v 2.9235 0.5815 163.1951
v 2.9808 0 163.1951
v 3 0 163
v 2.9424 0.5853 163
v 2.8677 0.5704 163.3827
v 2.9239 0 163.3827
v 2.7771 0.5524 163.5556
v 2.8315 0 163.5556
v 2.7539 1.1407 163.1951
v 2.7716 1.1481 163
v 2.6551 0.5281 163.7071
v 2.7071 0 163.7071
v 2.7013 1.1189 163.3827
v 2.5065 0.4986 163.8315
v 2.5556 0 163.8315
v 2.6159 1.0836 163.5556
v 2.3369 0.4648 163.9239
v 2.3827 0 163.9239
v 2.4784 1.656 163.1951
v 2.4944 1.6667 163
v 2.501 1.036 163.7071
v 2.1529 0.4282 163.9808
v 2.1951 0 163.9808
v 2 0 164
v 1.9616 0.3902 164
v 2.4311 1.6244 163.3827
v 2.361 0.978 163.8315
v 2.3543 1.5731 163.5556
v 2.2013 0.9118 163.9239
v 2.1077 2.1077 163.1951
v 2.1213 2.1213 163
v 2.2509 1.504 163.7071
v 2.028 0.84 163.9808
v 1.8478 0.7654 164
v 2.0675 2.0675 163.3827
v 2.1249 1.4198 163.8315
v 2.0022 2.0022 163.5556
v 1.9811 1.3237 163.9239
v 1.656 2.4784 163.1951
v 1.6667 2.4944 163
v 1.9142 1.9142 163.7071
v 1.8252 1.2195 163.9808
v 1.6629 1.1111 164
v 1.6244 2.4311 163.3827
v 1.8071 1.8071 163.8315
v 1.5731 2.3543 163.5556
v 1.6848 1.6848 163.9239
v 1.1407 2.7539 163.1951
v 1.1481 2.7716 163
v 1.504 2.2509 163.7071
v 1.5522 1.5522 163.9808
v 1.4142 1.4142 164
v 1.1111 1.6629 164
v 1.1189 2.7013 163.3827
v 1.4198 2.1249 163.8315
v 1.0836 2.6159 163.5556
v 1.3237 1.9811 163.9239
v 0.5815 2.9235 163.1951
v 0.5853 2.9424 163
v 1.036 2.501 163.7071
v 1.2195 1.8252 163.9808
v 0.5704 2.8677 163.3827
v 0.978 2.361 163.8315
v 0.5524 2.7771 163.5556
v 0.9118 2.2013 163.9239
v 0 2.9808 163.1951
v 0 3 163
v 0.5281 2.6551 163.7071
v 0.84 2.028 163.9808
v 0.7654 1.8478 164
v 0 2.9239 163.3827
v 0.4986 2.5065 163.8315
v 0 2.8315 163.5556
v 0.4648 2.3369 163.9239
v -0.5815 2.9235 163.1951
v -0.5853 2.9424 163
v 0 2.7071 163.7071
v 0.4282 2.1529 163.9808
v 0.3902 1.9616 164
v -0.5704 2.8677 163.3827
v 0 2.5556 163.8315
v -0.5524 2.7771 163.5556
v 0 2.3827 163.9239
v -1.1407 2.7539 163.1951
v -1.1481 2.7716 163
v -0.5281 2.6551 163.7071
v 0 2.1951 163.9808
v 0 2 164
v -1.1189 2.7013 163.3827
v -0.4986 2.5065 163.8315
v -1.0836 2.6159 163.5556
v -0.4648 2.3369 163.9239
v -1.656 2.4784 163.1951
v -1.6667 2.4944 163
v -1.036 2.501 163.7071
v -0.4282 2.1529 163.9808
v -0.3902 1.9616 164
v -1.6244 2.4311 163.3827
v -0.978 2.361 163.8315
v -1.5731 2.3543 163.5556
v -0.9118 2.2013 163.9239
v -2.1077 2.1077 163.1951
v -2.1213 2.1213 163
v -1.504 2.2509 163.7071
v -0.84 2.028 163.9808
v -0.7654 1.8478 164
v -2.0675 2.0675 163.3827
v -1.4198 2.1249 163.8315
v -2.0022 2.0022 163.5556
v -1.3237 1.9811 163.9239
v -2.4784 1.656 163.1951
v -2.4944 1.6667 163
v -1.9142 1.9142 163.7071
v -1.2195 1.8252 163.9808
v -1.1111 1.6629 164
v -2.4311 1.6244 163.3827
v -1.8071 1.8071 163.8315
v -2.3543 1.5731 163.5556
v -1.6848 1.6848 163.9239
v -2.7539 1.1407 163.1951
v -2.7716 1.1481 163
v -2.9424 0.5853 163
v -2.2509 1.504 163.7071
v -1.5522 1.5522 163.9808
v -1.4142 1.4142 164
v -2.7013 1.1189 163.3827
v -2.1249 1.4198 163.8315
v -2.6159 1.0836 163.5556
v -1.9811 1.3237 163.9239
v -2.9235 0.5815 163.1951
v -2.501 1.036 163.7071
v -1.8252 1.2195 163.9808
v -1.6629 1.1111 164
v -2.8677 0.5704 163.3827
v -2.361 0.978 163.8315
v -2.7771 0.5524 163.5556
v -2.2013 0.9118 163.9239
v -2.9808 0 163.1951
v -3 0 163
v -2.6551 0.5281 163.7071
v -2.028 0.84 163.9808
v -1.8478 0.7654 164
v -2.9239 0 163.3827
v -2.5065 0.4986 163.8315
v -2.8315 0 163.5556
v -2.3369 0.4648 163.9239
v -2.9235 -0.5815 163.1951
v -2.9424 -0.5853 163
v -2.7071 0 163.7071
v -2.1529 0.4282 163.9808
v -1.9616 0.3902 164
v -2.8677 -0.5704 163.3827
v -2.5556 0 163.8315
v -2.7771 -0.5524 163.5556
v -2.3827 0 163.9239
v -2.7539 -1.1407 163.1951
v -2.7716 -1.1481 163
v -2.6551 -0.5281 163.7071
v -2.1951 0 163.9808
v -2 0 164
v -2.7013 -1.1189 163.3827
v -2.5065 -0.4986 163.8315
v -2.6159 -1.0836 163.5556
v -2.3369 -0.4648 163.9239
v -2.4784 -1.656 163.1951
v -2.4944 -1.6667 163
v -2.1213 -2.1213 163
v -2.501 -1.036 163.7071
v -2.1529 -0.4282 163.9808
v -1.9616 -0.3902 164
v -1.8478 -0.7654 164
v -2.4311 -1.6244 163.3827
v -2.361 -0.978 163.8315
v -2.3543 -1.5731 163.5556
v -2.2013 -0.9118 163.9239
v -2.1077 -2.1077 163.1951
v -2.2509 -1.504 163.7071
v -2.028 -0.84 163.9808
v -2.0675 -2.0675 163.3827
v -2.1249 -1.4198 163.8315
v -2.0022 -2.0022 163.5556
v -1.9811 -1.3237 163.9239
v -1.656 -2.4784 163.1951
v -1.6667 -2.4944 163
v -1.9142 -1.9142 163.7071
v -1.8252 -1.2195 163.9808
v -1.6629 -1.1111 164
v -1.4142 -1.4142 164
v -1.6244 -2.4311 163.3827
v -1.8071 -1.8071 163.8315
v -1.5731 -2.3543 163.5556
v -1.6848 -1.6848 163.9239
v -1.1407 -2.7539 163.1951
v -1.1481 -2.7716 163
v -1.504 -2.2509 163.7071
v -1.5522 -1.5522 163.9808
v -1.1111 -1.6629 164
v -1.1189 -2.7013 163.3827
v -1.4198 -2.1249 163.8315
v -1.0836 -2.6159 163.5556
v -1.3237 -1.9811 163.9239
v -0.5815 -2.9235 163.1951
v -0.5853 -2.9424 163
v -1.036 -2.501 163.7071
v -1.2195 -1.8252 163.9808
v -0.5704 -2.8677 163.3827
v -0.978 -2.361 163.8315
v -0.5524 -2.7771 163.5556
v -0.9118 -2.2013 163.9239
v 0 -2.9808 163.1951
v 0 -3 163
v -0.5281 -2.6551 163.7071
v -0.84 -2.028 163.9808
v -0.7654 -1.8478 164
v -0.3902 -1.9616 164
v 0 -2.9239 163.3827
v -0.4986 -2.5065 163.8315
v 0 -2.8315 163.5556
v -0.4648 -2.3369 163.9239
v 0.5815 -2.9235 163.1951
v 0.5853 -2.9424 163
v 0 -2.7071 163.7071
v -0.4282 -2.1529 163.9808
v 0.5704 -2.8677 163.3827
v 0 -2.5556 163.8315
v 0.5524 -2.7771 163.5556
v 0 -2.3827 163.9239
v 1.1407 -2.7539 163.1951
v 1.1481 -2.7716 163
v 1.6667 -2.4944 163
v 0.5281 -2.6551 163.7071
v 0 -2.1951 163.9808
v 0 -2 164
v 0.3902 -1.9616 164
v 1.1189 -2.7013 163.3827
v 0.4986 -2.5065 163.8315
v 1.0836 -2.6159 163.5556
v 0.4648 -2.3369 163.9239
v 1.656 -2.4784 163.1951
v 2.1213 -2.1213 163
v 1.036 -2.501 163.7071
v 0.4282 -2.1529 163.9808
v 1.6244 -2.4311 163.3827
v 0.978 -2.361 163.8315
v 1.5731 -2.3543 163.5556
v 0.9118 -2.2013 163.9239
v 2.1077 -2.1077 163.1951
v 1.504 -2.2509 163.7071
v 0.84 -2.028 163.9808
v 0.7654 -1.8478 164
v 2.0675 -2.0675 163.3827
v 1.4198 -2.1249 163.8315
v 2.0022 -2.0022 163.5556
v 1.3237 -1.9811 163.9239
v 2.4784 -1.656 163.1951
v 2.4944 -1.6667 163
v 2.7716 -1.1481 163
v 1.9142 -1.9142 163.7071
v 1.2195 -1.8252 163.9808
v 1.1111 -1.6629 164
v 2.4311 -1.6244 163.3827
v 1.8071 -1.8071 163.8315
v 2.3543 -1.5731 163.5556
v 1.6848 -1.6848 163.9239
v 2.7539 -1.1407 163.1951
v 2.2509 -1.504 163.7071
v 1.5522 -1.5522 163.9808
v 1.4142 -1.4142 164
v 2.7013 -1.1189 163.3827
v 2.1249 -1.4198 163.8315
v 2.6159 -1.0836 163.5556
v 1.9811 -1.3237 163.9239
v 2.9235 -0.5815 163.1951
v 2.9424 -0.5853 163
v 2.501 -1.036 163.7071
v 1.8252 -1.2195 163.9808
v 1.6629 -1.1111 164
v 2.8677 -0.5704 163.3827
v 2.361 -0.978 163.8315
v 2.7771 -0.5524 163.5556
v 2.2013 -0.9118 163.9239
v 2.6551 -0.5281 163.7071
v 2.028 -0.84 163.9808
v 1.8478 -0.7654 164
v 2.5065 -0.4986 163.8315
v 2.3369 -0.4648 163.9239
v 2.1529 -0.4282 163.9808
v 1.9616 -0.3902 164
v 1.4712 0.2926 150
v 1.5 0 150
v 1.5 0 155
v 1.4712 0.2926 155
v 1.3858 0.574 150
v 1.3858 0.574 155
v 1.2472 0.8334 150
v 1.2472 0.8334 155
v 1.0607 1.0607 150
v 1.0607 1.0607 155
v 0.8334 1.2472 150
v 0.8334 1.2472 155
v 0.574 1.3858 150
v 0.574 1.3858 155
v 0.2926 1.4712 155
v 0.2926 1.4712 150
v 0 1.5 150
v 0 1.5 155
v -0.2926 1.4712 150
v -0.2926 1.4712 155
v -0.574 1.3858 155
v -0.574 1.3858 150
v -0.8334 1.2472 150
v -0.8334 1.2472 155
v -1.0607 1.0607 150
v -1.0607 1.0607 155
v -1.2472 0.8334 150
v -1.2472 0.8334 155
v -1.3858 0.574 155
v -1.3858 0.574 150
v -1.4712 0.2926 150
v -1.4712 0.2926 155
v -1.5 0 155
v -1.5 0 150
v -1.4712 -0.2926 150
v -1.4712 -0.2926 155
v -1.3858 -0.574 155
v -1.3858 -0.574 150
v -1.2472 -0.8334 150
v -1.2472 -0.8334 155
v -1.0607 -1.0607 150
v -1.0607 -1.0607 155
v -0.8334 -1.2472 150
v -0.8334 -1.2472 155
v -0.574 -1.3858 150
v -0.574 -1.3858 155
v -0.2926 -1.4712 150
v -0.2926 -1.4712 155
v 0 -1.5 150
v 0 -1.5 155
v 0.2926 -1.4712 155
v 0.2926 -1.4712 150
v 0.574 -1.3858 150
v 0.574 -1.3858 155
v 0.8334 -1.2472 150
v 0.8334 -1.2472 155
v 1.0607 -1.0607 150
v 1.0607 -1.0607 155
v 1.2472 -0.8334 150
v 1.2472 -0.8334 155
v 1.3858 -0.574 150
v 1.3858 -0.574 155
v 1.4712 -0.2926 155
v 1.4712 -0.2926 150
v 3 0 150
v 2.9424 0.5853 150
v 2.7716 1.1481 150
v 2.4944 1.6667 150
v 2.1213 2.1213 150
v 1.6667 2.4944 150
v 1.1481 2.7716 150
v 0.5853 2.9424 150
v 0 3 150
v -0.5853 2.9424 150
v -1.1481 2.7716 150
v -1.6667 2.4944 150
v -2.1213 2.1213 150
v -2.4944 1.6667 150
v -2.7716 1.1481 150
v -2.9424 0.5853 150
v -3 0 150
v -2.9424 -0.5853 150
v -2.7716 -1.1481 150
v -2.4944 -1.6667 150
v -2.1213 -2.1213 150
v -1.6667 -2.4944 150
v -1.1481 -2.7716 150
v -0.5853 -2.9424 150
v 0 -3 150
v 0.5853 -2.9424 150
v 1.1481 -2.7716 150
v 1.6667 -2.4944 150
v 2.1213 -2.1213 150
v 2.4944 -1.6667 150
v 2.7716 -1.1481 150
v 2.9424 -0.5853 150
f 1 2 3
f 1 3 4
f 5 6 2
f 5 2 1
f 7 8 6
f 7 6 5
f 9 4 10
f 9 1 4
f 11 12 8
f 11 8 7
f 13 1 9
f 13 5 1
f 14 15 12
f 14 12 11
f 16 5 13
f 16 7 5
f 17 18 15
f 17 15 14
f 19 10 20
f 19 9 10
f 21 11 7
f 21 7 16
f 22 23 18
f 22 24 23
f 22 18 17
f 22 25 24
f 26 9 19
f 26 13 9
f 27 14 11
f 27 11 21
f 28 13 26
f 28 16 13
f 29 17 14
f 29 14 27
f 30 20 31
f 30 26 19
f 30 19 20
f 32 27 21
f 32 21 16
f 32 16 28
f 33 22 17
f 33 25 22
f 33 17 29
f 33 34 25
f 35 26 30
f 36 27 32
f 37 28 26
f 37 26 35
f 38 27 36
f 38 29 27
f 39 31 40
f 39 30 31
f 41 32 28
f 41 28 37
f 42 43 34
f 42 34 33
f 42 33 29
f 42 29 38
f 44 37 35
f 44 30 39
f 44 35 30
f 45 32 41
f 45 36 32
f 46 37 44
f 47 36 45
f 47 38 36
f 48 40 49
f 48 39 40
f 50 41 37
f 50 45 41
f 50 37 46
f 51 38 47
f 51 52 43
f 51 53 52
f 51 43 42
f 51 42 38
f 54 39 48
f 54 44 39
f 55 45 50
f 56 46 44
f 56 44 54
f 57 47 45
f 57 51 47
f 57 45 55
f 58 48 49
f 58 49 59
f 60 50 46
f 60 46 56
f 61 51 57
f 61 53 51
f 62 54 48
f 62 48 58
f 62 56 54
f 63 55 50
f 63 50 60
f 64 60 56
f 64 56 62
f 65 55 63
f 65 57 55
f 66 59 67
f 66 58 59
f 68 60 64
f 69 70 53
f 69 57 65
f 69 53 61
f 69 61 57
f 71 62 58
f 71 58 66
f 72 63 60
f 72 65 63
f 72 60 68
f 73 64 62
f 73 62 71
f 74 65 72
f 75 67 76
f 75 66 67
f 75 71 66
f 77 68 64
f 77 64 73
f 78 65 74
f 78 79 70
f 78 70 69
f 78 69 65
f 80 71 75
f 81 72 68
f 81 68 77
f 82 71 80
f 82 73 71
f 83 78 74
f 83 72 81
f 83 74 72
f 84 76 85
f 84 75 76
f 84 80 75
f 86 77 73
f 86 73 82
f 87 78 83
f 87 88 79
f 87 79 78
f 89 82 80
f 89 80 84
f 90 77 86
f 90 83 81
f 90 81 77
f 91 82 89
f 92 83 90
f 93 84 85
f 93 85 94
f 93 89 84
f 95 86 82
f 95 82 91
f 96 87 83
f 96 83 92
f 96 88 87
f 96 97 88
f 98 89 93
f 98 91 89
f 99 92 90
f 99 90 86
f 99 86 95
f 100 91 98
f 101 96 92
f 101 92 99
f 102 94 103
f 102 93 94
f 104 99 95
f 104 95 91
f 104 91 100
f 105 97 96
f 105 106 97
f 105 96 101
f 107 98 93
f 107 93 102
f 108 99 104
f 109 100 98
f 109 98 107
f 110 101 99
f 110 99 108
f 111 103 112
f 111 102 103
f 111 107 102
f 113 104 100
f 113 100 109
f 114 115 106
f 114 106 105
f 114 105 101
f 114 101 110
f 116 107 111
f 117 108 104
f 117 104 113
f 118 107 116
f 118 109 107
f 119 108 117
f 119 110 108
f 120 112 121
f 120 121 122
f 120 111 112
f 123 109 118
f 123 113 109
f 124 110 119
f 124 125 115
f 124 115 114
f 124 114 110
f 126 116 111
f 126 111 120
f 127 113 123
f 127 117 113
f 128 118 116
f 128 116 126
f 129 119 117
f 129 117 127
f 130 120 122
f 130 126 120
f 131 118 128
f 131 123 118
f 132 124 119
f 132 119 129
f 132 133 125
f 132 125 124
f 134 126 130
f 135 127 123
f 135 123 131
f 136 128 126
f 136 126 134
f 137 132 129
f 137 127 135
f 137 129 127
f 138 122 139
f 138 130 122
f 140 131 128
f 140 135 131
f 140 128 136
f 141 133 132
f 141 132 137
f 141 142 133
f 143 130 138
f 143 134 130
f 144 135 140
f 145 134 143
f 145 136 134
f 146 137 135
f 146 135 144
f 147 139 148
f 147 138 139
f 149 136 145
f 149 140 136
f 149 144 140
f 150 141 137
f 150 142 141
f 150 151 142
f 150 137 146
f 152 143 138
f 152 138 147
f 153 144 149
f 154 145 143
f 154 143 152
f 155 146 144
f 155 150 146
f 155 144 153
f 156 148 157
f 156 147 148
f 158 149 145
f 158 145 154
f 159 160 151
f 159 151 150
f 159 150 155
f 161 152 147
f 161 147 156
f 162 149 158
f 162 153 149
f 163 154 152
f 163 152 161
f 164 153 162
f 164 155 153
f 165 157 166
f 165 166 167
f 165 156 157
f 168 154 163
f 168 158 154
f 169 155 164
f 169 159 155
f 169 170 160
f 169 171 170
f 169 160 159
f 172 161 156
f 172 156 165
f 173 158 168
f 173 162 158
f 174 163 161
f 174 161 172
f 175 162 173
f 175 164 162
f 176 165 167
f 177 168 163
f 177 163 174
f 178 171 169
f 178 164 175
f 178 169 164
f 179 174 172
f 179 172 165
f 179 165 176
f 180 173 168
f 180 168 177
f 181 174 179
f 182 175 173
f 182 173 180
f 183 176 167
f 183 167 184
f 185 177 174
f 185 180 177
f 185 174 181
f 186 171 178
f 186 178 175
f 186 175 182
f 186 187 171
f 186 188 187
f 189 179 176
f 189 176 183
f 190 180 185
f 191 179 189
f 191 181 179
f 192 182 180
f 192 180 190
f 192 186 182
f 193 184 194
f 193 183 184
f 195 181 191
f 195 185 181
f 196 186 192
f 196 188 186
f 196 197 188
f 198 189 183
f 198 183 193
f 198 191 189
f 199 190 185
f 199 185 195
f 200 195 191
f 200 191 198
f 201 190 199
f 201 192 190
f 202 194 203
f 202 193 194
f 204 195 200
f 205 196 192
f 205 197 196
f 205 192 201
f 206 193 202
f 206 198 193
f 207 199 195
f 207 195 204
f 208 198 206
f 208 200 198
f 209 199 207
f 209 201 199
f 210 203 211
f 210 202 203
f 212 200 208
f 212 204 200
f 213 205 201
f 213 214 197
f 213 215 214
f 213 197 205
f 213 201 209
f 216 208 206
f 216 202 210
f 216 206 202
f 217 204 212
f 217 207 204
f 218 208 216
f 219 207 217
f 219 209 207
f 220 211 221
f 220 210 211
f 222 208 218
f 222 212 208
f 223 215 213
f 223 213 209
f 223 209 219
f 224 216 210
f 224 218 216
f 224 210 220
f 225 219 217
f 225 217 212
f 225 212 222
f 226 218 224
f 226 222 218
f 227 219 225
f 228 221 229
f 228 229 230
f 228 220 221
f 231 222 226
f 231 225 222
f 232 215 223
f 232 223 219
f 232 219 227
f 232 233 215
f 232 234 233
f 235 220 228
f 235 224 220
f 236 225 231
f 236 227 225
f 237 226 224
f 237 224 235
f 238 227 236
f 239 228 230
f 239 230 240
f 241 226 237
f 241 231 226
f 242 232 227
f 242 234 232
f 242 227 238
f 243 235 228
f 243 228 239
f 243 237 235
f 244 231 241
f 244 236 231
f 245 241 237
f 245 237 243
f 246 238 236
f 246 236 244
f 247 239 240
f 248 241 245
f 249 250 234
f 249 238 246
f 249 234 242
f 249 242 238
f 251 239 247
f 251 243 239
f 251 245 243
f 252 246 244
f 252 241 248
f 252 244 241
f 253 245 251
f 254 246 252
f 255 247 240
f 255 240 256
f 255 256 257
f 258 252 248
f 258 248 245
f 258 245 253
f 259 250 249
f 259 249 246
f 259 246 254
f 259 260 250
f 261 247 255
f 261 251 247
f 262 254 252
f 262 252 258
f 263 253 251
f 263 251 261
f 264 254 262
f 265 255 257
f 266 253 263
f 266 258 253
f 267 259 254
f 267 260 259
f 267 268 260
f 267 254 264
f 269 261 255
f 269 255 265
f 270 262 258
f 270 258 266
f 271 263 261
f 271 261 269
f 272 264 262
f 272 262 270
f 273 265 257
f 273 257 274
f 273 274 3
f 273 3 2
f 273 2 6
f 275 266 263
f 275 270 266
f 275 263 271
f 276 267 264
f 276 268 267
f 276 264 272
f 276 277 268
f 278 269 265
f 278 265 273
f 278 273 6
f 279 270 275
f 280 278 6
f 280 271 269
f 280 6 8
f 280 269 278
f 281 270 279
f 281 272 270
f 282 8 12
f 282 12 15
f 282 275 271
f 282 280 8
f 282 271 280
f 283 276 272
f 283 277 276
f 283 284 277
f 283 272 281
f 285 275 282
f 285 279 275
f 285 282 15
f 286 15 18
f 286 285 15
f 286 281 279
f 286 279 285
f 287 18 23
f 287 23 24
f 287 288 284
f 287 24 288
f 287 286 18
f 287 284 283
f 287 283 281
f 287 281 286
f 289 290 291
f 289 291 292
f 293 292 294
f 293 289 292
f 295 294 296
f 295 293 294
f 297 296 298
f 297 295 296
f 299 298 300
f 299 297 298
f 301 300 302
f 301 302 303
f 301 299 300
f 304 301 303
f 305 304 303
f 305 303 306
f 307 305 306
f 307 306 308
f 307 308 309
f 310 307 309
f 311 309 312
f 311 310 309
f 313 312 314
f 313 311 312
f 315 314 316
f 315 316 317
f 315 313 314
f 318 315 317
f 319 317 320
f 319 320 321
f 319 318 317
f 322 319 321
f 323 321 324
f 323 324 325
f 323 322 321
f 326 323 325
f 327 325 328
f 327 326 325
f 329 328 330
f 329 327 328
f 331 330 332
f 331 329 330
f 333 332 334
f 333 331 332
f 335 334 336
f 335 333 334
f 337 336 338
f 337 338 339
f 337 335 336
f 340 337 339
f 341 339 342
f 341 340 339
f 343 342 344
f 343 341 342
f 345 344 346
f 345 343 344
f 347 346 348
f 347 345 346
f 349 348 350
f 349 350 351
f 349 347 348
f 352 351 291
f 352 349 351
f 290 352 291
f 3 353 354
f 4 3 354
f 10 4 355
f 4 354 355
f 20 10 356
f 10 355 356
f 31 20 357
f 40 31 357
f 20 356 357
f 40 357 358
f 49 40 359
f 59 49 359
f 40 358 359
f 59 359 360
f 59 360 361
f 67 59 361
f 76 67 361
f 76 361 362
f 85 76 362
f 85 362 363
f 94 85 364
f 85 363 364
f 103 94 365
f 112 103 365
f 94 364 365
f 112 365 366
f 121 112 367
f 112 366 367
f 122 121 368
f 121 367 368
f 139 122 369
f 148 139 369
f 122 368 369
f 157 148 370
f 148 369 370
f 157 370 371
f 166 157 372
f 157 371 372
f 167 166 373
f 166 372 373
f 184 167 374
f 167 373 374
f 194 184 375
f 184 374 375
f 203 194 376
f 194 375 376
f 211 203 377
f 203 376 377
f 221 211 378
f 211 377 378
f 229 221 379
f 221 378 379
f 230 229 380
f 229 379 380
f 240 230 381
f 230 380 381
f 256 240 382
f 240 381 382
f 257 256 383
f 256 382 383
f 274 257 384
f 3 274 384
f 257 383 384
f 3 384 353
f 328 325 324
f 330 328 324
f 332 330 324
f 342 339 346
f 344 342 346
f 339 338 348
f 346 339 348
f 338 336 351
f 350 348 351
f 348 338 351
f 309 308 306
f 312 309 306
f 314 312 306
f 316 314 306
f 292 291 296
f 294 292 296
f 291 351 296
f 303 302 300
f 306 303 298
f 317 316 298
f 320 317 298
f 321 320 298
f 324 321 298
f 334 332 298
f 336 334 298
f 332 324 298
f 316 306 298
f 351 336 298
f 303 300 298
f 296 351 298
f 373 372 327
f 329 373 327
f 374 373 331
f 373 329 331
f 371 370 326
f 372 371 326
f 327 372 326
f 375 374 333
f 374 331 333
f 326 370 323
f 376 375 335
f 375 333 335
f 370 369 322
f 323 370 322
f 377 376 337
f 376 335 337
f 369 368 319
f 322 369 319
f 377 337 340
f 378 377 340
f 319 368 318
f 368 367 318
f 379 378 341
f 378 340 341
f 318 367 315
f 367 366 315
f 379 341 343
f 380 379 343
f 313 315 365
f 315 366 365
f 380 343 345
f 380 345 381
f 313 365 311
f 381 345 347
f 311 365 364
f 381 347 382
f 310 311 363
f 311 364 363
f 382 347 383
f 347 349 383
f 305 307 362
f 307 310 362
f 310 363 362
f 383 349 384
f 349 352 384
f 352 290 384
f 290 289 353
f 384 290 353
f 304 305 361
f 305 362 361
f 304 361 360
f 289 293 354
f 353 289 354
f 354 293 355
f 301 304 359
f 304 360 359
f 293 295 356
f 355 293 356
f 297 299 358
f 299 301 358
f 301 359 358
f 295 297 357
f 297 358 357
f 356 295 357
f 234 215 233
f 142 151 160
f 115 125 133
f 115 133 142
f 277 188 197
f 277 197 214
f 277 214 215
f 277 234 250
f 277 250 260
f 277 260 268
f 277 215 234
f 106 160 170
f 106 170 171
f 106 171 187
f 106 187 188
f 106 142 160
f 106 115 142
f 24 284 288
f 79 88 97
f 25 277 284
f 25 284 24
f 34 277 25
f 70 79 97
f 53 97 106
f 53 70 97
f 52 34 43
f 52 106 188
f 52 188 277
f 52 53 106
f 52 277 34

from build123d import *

# Parameters (mm, degrees)
CYLINDER009_R     = 1.5
CYLINDER009_DEPTH = 5
CYLINDER006_R     = 3
CYLINDER006_DEPTH = 14
FILLET_R          = 1


with BuildPart() as cylinder009:
    # Cylinder009 → Cylinder009 (new body)
    with BuildSketch(Plane.XY.offset(150)):
        Circle(CYLINDER009_R)
    extrude(amount=CYLINDER009_DEPTH)


with BuildPart() as cut005:
    # Cylinder006 → Cylinder006 (new body)
    with BuildSketch(Plane.XY.offset(150)):
        Circle(CYLINDER006_R)
    extrude(amount=CYLINDER006_DEPTH)

    # Fillet
    fillet_edges = [cut005.edges().sort_by_distance(p)[0] for p in [
        (-3, 0, 164),
    ]]
    fillet(fillet_edges, radius=FILLET_R)

    # Cut005: cut Cylinder009
    add(cylinder009.part, mode=Mode.SUBTRACT)


solid = cut005.part
